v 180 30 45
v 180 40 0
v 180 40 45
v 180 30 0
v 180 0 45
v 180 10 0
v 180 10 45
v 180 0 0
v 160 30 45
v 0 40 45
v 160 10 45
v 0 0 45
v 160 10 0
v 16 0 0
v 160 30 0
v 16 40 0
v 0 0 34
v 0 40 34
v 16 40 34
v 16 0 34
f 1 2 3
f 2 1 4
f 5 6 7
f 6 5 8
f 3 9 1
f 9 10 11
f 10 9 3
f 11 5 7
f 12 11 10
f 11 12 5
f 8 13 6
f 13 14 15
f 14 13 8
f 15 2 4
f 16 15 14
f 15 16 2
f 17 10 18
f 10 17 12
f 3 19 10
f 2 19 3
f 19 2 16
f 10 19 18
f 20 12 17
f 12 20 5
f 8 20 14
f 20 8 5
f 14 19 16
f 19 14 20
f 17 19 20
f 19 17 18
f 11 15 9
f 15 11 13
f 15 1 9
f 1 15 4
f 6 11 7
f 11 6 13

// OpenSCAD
LenX=180;
WidthY=40;
HightZ=45;
ListH=34;
ListD=16;
Buff=5;
DB=Buff*2;
FeetDia=20;
YSpace=(WidthY-FeetDia)/2;

difference()
{
  cube([LenX,WidthY,HightZ]);
  translate([-Buff,-Buff,-Buff]) cube([ListD+Buff,WidthY+DB,ListH+Buff]);
  translate([LenX-FeetDia,YSpace,-Buff]) 
    cube([FeetDia+Buff,FeetDia,HightZ+DB]);
}
